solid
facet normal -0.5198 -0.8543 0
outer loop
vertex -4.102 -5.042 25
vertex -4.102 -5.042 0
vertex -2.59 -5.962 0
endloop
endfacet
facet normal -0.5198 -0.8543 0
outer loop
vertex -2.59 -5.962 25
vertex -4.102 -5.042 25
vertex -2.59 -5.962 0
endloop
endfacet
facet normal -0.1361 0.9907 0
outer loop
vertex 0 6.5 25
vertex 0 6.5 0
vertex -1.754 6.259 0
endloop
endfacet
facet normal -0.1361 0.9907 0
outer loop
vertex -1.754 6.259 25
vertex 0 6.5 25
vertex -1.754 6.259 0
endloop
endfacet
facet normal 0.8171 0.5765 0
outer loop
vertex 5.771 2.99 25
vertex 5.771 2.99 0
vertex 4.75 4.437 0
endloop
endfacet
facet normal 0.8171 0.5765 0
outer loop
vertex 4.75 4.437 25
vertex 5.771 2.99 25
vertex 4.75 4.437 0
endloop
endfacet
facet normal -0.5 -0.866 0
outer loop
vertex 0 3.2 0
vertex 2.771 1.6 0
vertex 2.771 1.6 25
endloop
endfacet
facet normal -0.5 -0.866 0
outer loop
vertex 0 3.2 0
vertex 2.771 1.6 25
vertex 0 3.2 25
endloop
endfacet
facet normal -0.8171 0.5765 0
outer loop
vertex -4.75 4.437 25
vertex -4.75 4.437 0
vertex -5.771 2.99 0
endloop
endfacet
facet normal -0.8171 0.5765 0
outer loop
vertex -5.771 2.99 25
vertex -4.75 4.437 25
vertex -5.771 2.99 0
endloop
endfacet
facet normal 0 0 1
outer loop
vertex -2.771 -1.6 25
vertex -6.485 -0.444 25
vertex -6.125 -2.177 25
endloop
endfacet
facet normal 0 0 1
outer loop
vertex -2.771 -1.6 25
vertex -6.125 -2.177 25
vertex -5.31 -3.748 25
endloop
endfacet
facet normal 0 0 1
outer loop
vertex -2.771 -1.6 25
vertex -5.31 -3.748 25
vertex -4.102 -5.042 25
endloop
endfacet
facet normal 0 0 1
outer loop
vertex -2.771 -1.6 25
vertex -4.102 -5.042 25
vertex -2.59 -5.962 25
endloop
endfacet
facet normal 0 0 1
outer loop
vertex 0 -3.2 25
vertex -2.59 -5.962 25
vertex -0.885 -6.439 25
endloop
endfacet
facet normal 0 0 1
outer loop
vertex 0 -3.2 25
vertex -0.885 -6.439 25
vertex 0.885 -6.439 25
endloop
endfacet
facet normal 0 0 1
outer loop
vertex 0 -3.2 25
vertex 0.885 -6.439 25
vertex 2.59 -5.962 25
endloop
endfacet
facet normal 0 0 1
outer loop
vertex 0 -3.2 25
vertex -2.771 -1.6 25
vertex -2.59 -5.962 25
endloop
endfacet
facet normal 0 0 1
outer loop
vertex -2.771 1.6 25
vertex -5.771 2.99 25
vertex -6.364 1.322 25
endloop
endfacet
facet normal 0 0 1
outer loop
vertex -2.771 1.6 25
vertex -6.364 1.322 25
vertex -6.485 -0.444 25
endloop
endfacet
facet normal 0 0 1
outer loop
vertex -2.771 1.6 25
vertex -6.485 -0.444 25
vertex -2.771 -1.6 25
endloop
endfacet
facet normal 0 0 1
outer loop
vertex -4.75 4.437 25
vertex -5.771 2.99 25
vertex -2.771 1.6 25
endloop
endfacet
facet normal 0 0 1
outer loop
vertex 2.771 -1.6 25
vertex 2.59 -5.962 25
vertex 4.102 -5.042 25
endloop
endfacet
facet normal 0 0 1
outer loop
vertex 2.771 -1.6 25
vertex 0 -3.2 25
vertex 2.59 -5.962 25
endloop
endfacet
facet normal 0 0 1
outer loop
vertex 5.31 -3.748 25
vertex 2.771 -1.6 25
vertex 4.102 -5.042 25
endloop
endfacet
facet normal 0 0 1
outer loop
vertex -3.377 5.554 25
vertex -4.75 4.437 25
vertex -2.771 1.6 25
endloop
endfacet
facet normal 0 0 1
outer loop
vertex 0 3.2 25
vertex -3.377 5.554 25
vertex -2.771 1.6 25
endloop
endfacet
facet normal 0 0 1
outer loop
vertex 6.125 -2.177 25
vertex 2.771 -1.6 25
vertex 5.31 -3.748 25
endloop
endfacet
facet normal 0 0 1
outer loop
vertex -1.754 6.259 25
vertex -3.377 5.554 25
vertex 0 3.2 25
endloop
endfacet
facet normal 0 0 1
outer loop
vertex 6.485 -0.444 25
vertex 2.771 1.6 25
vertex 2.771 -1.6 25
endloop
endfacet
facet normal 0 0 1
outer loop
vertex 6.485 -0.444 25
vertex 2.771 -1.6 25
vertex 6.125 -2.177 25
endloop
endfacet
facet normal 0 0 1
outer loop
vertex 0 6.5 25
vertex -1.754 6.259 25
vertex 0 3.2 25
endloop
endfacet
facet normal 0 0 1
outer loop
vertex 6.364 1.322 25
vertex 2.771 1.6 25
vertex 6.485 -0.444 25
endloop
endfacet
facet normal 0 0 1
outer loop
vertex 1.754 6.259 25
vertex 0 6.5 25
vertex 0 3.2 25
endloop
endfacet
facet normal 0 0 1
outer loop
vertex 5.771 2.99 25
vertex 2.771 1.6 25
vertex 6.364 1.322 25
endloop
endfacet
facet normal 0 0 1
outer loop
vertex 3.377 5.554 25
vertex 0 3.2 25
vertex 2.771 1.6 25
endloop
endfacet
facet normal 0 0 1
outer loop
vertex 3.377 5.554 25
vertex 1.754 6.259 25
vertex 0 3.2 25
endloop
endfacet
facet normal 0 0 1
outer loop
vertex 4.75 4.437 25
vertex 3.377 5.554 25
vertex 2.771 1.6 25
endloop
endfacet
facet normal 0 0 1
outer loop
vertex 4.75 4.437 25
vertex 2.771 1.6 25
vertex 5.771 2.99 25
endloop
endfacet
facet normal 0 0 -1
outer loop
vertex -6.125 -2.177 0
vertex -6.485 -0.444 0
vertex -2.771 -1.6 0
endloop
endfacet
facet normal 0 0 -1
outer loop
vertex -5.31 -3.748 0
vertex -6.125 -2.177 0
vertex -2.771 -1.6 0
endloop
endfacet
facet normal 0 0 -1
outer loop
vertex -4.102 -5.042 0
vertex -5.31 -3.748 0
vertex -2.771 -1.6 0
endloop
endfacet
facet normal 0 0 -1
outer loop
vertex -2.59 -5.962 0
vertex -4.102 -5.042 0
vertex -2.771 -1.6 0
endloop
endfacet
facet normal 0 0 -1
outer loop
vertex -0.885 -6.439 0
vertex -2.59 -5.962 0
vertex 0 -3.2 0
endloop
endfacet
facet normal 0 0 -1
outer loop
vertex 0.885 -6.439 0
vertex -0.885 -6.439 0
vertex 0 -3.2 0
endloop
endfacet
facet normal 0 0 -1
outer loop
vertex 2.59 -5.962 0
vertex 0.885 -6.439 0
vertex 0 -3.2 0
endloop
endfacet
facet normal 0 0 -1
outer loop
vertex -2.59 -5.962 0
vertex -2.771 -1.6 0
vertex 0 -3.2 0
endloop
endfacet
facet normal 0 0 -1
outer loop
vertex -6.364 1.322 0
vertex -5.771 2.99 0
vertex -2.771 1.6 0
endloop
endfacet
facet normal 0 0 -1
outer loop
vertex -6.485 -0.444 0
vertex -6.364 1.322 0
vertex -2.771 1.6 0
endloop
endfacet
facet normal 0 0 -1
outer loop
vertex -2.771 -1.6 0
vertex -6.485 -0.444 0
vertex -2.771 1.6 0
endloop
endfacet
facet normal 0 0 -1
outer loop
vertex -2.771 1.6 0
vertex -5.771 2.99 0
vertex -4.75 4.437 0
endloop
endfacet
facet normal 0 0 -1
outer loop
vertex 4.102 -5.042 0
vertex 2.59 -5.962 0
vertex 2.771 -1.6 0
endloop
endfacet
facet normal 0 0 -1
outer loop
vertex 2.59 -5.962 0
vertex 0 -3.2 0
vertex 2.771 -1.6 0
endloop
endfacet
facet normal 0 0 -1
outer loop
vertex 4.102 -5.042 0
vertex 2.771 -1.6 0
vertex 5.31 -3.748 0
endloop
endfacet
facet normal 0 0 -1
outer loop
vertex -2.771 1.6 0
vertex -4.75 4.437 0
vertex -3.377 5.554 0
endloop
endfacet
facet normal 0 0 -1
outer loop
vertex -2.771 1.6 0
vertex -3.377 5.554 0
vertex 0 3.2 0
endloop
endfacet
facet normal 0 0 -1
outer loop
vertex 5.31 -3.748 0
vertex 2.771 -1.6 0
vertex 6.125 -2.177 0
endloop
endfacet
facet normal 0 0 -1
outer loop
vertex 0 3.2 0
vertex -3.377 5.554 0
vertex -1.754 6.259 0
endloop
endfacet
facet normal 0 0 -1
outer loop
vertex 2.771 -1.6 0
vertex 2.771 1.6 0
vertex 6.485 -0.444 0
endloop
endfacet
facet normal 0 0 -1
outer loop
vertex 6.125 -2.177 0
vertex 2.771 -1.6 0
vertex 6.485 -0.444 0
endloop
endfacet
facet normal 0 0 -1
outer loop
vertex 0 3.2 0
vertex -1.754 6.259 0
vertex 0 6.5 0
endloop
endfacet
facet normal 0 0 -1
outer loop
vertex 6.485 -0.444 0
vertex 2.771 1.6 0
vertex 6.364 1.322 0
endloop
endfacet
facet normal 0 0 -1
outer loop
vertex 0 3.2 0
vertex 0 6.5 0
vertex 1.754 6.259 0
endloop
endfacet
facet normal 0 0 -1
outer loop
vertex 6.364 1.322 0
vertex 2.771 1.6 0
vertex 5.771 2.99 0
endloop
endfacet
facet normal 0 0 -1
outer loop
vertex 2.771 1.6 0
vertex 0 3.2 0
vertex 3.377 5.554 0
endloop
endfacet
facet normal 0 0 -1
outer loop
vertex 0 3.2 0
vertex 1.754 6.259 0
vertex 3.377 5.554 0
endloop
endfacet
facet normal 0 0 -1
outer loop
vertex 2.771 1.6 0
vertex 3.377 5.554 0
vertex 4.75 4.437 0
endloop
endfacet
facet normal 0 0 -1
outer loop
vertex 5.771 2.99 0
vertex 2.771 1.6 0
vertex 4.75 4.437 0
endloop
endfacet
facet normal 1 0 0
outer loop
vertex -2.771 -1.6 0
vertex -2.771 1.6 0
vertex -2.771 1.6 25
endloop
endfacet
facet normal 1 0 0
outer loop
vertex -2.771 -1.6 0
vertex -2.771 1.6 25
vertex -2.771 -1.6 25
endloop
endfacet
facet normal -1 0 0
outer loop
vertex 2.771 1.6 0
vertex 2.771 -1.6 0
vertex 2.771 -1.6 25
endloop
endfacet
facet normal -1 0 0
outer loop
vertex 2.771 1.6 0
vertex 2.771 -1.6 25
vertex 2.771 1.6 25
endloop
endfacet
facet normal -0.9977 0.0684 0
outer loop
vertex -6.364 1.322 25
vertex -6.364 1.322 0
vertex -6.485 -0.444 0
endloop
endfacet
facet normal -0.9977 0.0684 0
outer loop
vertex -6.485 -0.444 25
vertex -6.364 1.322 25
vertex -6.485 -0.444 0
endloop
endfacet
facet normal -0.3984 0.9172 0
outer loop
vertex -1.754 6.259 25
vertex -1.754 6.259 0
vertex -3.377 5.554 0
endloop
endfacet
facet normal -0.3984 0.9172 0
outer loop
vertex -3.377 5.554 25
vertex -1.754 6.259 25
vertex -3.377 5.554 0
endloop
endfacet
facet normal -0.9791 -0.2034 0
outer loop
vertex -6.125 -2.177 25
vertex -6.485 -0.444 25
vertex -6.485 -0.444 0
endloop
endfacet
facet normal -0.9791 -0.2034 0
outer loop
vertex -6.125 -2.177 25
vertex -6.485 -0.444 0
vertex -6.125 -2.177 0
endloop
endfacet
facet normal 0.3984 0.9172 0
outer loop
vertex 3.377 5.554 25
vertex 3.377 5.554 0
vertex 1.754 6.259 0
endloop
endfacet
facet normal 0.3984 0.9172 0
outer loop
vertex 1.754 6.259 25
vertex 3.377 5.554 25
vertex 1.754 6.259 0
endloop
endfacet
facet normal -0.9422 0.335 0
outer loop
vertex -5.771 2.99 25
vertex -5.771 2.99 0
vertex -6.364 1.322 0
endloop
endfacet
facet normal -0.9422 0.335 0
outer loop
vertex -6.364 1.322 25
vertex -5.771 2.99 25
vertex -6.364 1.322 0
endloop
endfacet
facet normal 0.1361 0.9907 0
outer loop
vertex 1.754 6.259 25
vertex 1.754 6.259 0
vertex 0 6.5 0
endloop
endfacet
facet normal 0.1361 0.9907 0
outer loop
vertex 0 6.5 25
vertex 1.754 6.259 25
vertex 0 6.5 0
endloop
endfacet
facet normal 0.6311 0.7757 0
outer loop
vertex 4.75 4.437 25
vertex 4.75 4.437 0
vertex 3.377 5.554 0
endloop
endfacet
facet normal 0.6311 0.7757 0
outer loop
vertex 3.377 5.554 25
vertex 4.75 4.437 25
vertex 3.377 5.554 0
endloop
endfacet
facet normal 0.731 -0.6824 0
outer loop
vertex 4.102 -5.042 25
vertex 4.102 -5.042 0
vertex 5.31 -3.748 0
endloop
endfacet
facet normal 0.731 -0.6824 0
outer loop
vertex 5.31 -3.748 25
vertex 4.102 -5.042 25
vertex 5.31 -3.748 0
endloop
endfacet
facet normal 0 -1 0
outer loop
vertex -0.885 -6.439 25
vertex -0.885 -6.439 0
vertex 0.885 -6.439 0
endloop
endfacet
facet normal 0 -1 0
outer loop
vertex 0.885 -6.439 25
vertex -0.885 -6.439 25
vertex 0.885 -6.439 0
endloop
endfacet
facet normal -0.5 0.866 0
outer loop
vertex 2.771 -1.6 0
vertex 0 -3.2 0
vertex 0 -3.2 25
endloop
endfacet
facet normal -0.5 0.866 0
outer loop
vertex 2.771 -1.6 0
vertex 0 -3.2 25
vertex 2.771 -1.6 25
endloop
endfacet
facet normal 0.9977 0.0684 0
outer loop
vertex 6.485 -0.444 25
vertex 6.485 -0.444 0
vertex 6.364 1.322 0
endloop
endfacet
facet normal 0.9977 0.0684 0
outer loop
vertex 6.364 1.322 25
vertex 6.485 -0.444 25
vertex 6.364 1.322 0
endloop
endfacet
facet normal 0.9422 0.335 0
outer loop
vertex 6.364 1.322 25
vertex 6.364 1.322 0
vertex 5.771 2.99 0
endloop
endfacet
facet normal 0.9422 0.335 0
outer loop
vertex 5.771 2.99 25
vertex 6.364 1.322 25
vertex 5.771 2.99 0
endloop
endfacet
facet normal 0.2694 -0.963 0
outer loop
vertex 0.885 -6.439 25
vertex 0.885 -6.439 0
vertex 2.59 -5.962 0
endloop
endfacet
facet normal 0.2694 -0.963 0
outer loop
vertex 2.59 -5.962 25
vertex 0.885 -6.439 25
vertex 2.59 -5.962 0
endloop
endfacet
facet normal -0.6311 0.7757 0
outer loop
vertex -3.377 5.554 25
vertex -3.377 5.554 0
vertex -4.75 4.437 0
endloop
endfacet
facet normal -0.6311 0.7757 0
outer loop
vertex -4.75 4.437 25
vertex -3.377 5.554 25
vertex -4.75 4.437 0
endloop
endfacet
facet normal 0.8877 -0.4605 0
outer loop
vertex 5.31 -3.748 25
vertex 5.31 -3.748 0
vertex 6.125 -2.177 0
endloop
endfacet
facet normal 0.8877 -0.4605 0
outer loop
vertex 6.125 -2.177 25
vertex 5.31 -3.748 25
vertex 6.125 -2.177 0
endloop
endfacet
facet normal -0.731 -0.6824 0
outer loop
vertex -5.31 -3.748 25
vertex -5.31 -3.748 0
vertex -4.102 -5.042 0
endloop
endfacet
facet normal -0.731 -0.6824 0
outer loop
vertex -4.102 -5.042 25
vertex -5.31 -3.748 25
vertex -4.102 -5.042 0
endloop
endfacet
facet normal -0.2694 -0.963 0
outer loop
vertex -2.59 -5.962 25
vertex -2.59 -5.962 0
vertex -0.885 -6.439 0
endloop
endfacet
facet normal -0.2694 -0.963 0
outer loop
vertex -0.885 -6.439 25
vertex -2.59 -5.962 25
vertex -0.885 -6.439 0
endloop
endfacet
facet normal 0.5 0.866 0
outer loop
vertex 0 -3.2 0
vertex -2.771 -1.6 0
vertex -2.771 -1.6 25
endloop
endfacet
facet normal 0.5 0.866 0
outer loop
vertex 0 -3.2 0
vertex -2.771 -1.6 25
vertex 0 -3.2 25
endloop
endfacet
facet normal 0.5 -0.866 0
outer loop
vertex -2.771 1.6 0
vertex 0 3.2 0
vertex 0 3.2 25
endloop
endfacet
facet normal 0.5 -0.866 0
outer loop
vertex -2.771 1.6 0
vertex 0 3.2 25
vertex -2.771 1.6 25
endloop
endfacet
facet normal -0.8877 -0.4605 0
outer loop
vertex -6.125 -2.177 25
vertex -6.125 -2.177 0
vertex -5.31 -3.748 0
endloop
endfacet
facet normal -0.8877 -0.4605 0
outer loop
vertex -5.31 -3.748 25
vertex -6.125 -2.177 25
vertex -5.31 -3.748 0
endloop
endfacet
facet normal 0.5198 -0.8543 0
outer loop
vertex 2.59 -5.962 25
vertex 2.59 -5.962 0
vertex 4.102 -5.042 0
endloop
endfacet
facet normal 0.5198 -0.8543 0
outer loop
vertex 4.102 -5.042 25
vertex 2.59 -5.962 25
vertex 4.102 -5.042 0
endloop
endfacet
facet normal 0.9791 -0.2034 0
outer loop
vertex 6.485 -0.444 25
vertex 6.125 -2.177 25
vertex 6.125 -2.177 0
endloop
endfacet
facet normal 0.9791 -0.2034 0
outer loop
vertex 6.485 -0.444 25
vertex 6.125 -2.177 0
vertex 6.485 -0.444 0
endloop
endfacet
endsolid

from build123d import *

# Parameters (mm, degrees)
PAD_DEPTH = 25


with BuildPart() as part:
    # Sketch → Pad (new body)
    with BuildSketch(Plane.XY):
        Polygon((4.750434, 4.436595), (3.377296, 5.553726), (1.753679, 6.258962), (0, 6.5), (-1.753679, 6.258962), (-3.377296, 5.553726), (-4.750434, 4.436595), (-5.771254, 2.990423), (-6.364047, 1.322464), (-6.484847, -0.443576), (-6.124696, -2.176717), (-5.310304, -3.748422), (-4.102072, -5.042123), (-2.589607, -5.961873), (-0.885083, -6.439459), (0.885083, -6.439459), (2.589607, -5.961873), (4.102072, -5.042123), (5.310304, -3.748422), (6.124696, -2.176717), (6.484847, -0.443576), (6.364047, 1.322464), (5.771254, 2.990423), align=None)
        Polygon((2.771281, -1.6), (2.771281, 1.6), (0, 3.2), (-2.771281, 1.6), (-2.771281, -1.6), (0, -3.2), align=None, mode=Mode.SUBTRACT)
    extrude(amount=PAD_DEPTH)


solid = part.part
